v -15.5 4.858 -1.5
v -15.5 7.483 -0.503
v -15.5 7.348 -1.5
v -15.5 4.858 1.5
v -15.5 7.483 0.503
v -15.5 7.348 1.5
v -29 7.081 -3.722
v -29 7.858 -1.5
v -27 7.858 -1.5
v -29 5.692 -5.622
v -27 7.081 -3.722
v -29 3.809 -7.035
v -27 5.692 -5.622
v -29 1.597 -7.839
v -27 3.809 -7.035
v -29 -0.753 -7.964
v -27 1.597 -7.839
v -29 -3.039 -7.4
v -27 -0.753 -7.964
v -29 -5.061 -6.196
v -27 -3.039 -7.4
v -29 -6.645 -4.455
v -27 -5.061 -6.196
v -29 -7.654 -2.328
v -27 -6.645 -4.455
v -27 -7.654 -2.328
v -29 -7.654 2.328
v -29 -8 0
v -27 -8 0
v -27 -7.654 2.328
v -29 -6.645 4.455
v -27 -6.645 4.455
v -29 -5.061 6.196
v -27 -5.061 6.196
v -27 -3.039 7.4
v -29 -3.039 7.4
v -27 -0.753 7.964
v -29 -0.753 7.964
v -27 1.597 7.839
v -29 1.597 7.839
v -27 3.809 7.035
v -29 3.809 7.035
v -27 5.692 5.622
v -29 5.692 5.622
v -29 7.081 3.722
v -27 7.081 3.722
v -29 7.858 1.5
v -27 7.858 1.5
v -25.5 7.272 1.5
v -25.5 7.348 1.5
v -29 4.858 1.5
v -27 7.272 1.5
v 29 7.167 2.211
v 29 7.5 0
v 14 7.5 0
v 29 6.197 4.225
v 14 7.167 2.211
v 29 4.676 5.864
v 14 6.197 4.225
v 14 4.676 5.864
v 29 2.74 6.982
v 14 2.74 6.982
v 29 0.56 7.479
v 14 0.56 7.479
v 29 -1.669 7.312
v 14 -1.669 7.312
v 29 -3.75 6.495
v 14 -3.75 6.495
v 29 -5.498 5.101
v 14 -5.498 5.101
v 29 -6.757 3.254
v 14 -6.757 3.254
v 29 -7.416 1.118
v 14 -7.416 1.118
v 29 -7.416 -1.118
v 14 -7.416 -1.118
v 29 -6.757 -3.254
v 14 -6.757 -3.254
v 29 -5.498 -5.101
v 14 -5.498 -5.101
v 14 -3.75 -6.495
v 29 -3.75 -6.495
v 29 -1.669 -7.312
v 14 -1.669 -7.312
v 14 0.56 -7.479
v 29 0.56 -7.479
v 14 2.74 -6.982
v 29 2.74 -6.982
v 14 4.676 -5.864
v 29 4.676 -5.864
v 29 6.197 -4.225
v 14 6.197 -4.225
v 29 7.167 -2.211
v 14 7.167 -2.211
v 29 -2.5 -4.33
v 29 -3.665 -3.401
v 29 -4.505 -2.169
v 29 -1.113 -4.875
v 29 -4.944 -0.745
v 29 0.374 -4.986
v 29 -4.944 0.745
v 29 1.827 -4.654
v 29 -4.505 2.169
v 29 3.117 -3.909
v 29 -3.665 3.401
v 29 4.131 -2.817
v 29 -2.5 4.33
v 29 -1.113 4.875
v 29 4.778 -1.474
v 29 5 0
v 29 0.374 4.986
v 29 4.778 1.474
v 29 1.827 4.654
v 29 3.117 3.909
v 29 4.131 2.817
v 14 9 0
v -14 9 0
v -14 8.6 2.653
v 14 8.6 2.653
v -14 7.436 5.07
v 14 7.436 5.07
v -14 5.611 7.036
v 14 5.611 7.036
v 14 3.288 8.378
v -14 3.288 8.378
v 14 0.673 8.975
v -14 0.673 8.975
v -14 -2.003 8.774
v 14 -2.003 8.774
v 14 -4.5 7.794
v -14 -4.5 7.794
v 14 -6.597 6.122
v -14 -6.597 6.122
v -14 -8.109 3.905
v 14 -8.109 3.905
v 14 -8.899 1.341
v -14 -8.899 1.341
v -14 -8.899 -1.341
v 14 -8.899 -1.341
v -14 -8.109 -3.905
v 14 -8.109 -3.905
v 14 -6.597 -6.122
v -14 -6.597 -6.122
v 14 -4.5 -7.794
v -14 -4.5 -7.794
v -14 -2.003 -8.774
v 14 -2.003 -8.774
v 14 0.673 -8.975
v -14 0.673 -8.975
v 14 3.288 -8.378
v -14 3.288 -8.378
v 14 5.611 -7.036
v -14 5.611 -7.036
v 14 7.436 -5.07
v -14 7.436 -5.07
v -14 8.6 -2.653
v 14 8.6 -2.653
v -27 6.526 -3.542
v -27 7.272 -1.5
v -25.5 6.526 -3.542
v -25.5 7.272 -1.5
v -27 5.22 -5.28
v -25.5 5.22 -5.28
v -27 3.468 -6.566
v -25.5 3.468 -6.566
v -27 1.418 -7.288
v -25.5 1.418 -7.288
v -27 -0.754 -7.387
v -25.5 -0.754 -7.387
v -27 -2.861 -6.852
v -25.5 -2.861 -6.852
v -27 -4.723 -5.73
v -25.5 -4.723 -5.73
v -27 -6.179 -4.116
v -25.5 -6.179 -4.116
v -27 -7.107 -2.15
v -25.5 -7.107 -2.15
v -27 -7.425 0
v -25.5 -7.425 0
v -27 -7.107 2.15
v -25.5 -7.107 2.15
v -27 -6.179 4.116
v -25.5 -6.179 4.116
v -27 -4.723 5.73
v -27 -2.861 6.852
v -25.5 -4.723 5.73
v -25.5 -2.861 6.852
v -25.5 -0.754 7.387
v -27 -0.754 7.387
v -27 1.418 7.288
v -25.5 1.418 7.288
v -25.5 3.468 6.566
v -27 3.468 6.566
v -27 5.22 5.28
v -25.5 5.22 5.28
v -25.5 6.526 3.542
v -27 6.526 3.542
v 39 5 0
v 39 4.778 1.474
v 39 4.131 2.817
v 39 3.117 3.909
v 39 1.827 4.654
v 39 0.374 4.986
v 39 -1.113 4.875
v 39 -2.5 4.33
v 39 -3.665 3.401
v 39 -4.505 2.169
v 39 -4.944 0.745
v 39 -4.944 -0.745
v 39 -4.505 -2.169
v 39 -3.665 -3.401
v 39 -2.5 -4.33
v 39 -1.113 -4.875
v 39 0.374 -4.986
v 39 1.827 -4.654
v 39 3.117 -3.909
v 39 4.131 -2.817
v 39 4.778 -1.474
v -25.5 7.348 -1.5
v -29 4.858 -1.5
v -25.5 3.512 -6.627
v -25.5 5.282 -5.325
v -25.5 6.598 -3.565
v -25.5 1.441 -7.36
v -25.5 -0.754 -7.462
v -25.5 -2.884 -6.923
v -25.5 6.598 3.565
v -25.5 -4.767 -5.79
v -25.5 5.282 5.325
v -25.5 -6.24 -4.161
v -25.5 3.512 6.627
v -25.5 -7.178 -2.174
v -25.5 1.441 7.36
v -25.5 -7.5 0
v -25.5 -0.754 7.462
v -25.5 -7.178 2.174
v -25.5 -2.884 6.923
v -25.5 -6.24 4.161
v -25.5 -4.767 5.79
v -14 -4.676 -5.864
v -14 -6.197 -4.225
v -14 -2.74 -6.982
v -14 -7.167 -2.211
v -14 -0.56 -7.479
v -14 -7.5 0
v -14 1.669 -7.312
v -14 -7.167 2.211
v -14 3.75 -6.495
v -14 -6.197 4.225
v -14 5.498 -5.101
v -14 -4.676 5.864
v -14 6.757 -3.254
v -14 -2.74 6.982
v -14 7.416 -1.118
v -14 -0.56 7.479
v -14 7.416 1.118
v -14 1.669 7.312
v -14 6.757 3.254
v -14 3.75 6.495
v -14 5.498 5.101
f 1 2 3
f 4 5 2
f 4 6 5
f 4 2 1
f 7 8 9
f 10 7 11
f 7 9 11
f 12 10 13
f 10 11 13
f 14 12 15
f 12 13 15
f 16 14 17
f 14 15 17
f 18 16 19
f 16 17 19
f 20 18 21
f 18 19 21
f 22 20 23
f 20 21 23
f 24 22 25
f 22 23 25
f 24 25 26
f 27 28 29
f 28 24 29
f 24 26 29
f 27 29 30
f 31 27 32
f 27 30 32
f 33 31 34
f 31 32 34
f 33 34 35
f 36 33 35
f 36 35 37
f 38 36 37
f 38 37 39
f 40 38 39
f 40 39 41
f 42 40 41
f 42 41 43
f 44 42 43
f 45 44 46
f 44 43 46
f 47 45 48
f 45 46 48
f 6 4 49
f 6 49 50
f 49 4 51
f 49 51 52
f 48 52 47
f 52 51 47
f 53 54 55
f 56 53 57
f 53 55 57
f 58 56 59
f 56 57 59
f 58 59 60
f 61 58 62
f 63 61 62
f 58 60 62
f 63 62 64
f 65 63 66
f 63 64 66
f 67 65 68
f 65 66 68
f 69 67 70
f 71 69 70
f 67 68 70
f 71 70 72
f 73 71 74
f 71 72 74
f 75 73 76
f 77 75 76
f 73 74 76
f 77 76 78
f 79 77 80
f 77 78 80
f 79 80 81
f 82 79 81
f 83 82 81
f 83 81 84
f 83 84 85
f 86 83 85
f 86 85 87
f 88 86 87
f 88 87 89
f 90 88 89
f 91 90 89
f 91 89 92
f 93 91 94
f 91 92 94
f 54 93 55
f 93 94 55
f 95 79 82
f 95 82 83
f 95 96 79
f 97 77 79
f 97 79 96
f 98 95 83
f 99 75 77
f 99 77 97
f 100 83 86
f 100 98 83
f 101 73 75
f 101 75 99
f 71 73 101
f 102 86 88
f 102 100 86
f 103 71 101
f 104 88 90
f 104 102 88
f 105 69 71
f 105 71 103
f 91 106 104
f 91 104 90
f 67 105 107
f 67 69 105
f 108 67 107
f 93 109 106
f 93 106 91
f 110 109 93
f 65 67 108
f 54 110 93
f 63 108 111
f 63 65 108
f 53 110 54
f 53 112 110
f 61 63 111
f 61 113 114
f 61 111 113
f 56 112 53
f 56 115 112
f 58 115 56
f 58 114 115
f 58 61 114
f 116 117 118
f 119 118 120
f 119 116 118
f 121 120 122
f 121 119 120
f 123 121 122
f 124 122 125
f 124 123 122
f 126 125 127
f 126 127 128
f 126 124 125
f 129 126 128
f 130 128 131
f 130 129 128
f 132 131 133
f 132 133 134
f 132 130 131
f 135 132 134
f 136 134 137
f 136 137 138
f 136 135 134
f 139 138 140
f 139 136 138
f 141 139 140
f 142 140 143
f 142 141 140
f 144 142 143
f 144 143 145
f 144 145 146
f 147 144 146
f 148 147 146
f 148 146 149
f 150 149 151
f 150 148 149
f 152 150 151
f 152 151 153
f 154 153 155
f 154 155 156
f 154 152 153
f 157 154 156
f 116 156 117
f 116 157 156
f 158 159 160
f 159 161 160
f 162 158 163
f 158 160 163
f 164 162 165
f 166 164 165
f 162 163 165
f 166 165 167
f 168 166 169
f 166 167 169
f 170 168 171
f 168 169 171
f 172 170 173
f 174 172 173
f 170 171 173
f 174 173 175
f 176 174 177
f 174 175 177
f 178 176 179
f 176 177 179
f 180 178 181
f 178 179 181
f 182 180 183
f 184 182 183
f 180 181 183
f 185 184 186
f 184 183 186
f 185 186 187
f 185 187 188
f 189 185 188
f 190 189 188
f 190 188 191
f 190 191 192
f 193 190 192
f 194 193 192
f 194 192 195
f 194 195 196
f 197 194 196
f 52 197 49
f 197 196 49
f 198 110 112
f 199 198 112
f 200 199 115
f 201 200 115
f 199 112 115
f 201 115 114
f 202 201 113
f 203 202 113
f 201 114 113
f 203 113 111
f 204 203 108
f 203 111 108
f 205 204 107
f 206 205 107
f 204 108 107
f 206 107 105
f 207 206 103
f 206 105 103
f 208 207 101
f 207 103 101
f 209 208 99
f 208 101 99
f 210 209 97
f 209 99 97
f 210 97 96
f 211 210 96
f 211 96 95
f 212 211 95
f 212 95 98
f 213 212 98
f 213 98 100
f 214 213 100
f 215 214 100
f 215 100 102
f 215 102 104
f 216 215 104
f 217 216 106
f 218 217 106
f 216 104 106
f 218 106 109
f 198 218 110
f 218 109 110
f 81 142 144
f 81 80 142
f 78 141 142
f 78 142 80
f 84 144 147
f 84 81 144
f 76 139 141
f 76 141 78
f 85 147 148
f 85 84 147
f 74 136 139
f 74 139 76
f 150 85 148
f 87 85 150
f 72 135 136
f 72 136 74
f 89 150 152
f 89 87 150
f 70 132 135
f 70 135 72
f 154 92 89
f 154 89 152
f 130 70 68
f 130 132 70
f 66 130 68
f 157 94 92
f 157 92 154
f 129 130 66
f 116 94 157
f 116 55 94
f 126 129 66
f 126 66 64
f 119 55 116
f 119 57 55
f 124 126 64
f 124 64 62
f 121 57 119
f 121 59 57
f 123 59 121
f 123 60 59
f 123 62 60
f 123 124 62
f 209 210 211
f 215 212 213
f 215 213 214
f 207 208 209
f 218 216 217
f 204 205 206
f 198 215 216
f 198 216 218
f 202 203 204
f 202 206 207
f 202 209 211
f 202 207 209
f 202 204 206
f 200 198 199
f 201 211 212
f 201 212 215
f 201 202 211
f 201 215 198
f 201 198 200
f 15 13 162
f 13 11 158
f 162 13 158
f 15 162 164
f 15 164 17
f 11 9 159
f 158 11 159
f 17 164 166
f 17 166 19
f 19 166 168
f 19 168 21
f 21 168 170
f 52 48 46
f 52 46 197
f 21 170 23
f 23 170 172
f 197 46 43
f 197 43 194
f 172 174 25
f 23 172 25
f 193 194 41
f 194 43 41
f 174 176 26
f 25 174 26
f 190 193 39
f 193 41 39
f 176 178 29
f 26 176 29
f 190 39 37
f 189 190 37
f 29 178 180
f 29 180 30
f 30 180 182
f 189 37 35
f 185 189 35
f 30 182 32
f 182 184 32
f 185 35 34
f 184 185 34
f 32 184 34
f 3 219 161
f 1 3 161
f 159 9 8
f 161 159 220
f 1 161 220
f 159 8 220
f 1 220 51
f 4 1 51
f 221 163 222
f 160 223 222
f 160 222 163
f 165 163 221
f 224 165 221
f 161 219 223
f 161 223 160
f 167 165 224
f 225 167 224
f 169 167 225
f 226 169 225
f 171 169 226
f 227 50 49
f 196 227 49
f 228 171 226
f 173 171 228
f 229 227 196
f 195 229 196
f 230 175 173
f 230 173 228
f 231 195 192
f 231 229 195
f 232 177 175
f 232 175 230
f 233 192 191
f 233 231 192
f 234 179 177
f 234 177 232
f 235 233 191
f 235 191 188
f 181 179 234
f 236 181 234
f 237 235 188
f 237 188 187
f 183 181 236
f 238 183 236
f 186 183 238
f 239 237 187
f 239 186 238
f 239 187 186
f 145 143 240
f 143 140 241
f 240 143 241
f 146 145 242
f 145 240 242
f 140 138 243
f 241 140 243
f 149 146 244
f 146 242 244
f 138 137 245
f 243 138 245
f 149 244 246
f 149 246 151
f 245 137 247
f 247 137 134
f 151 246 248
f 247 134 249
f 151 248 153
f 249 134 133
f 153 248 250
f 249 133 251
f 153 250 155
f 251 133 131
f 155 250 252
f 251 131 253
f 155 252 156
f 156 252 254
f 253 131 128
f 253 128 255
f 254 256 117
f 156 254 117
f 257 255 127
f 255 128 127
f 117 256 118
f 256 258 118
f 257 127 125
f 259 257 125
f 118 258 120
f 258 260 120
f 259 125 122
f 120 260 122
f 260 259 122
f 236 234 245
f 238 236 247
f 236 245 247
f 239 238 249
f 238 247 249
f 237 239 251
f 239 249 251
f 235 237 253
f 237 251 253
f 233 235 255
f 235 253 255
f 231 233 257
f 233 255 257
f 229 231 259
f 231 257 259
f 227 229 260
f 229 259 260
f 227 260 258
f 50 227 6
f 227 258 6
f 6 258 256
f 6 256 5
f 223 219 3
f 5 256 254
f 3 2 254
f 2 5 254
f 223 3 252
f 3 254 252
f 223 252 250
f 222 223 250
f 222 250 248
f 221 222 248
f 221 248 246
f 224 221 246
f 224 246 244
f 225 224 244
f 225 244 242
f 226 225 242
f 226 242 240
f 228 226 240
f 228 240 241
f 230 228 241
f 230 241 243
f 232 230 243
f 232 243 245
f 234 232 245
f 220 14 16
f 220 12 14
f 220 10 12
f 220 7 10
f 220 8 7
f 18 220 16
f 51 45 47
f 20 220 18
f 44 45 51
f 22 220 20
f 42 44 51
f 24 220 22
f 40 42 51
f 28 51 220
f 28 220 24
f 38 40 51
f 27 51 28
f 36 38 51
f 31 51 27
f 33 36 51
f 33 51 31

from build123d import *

# Parameters (mm, degrees)
F0_R      = 9
F1_DEPTH  = 14
F2_R      = 7.5
F3_DEPTH  = 15
F4_R      = 5
F5_DEPTH  = 10
F6_R      = 7.5
F7_DEPTH  = 11.5
F8_R      = 7.425
F9_DEPTH  = 1.5
F10_R     = 8
F11_DEPTH = 2
F13_DEPTH = 13.5


with BuildPart() as f1:
    # F0 (on Right) → F1 (new body, symmetric)
    with BuildSketch(Plane.YZ):
        Circle(F0_R)
    extrude(amount=F1_DEPTH, both=True)

    # F2 (on face) → F3 (join)
    with BuildSketch(Plane.YZ.offset(14)):
        Circle(F2_R)
    extrude(amount=F3_DEPTH)

    # F4 (on face) → F5 (join)
    with BuildSketch(Plane.YZ.offset(29)):
        Circle(F4_R)
    extrude(amount=F5_DEPTH)

    # F6 (on face) → F7 (join)
    with BuildSketch(Plane(origin=(-14, 0, 0), x_dir=(0, -1, 0), z_dir=(-1, 0, 0))):
        Circle(F6_R)
    extrude(amount=F7_DEPTH)

    # F8 (on face) → F9 (join)
    with BuildSketch(Plane(origin=(-25.5, 0, 0), x_dir=(0, -1, 0), z_dir=(-1, 0, 0))):
        Circle(F8_R)
    extrude(amount=F9_DEPTH)

    # F10 (on face) → F11 (join)
    with BuildSketch(Plane(origin=(-27, 0, 0), x_dir=(0, -1, 0), z_dir=(-1, 0, 0))):
        Circle(F10_R)
    extrude(amount=F11_DEPTH)

    # F12 (on face) → F13 (cut)
    with BuildSketch(Plane(origin=(-29, 0, 0), x_dir=(0, -1, 0), z_dir=(-1, 0, 0))):
        with BuildLine():
            Line((-7.8581168228, -1.5), (-4.8581168228, -1.5))
            Line((-4.8581168228, -1.5), (-4.8581168228, 1.5))
            Line((-4.8581168228, 1.5), (-7.8581168228, 1.5))
            add(Edge.make_bspline(
                [(-7.8581168228, 1.5), (-8.0546390686, 1), (-8.4476835604, 0), (-8.0546390686, -1), (-7.8581168228, -1.5)],
                knots=[0, 0, 0, 0, 0.5, 1, 1, 1, 1], degree=3))
        make_face()
    extrude(amount=-F13_DEPTH, mode=Mode.SUBTRACT)


solid = f1.part
